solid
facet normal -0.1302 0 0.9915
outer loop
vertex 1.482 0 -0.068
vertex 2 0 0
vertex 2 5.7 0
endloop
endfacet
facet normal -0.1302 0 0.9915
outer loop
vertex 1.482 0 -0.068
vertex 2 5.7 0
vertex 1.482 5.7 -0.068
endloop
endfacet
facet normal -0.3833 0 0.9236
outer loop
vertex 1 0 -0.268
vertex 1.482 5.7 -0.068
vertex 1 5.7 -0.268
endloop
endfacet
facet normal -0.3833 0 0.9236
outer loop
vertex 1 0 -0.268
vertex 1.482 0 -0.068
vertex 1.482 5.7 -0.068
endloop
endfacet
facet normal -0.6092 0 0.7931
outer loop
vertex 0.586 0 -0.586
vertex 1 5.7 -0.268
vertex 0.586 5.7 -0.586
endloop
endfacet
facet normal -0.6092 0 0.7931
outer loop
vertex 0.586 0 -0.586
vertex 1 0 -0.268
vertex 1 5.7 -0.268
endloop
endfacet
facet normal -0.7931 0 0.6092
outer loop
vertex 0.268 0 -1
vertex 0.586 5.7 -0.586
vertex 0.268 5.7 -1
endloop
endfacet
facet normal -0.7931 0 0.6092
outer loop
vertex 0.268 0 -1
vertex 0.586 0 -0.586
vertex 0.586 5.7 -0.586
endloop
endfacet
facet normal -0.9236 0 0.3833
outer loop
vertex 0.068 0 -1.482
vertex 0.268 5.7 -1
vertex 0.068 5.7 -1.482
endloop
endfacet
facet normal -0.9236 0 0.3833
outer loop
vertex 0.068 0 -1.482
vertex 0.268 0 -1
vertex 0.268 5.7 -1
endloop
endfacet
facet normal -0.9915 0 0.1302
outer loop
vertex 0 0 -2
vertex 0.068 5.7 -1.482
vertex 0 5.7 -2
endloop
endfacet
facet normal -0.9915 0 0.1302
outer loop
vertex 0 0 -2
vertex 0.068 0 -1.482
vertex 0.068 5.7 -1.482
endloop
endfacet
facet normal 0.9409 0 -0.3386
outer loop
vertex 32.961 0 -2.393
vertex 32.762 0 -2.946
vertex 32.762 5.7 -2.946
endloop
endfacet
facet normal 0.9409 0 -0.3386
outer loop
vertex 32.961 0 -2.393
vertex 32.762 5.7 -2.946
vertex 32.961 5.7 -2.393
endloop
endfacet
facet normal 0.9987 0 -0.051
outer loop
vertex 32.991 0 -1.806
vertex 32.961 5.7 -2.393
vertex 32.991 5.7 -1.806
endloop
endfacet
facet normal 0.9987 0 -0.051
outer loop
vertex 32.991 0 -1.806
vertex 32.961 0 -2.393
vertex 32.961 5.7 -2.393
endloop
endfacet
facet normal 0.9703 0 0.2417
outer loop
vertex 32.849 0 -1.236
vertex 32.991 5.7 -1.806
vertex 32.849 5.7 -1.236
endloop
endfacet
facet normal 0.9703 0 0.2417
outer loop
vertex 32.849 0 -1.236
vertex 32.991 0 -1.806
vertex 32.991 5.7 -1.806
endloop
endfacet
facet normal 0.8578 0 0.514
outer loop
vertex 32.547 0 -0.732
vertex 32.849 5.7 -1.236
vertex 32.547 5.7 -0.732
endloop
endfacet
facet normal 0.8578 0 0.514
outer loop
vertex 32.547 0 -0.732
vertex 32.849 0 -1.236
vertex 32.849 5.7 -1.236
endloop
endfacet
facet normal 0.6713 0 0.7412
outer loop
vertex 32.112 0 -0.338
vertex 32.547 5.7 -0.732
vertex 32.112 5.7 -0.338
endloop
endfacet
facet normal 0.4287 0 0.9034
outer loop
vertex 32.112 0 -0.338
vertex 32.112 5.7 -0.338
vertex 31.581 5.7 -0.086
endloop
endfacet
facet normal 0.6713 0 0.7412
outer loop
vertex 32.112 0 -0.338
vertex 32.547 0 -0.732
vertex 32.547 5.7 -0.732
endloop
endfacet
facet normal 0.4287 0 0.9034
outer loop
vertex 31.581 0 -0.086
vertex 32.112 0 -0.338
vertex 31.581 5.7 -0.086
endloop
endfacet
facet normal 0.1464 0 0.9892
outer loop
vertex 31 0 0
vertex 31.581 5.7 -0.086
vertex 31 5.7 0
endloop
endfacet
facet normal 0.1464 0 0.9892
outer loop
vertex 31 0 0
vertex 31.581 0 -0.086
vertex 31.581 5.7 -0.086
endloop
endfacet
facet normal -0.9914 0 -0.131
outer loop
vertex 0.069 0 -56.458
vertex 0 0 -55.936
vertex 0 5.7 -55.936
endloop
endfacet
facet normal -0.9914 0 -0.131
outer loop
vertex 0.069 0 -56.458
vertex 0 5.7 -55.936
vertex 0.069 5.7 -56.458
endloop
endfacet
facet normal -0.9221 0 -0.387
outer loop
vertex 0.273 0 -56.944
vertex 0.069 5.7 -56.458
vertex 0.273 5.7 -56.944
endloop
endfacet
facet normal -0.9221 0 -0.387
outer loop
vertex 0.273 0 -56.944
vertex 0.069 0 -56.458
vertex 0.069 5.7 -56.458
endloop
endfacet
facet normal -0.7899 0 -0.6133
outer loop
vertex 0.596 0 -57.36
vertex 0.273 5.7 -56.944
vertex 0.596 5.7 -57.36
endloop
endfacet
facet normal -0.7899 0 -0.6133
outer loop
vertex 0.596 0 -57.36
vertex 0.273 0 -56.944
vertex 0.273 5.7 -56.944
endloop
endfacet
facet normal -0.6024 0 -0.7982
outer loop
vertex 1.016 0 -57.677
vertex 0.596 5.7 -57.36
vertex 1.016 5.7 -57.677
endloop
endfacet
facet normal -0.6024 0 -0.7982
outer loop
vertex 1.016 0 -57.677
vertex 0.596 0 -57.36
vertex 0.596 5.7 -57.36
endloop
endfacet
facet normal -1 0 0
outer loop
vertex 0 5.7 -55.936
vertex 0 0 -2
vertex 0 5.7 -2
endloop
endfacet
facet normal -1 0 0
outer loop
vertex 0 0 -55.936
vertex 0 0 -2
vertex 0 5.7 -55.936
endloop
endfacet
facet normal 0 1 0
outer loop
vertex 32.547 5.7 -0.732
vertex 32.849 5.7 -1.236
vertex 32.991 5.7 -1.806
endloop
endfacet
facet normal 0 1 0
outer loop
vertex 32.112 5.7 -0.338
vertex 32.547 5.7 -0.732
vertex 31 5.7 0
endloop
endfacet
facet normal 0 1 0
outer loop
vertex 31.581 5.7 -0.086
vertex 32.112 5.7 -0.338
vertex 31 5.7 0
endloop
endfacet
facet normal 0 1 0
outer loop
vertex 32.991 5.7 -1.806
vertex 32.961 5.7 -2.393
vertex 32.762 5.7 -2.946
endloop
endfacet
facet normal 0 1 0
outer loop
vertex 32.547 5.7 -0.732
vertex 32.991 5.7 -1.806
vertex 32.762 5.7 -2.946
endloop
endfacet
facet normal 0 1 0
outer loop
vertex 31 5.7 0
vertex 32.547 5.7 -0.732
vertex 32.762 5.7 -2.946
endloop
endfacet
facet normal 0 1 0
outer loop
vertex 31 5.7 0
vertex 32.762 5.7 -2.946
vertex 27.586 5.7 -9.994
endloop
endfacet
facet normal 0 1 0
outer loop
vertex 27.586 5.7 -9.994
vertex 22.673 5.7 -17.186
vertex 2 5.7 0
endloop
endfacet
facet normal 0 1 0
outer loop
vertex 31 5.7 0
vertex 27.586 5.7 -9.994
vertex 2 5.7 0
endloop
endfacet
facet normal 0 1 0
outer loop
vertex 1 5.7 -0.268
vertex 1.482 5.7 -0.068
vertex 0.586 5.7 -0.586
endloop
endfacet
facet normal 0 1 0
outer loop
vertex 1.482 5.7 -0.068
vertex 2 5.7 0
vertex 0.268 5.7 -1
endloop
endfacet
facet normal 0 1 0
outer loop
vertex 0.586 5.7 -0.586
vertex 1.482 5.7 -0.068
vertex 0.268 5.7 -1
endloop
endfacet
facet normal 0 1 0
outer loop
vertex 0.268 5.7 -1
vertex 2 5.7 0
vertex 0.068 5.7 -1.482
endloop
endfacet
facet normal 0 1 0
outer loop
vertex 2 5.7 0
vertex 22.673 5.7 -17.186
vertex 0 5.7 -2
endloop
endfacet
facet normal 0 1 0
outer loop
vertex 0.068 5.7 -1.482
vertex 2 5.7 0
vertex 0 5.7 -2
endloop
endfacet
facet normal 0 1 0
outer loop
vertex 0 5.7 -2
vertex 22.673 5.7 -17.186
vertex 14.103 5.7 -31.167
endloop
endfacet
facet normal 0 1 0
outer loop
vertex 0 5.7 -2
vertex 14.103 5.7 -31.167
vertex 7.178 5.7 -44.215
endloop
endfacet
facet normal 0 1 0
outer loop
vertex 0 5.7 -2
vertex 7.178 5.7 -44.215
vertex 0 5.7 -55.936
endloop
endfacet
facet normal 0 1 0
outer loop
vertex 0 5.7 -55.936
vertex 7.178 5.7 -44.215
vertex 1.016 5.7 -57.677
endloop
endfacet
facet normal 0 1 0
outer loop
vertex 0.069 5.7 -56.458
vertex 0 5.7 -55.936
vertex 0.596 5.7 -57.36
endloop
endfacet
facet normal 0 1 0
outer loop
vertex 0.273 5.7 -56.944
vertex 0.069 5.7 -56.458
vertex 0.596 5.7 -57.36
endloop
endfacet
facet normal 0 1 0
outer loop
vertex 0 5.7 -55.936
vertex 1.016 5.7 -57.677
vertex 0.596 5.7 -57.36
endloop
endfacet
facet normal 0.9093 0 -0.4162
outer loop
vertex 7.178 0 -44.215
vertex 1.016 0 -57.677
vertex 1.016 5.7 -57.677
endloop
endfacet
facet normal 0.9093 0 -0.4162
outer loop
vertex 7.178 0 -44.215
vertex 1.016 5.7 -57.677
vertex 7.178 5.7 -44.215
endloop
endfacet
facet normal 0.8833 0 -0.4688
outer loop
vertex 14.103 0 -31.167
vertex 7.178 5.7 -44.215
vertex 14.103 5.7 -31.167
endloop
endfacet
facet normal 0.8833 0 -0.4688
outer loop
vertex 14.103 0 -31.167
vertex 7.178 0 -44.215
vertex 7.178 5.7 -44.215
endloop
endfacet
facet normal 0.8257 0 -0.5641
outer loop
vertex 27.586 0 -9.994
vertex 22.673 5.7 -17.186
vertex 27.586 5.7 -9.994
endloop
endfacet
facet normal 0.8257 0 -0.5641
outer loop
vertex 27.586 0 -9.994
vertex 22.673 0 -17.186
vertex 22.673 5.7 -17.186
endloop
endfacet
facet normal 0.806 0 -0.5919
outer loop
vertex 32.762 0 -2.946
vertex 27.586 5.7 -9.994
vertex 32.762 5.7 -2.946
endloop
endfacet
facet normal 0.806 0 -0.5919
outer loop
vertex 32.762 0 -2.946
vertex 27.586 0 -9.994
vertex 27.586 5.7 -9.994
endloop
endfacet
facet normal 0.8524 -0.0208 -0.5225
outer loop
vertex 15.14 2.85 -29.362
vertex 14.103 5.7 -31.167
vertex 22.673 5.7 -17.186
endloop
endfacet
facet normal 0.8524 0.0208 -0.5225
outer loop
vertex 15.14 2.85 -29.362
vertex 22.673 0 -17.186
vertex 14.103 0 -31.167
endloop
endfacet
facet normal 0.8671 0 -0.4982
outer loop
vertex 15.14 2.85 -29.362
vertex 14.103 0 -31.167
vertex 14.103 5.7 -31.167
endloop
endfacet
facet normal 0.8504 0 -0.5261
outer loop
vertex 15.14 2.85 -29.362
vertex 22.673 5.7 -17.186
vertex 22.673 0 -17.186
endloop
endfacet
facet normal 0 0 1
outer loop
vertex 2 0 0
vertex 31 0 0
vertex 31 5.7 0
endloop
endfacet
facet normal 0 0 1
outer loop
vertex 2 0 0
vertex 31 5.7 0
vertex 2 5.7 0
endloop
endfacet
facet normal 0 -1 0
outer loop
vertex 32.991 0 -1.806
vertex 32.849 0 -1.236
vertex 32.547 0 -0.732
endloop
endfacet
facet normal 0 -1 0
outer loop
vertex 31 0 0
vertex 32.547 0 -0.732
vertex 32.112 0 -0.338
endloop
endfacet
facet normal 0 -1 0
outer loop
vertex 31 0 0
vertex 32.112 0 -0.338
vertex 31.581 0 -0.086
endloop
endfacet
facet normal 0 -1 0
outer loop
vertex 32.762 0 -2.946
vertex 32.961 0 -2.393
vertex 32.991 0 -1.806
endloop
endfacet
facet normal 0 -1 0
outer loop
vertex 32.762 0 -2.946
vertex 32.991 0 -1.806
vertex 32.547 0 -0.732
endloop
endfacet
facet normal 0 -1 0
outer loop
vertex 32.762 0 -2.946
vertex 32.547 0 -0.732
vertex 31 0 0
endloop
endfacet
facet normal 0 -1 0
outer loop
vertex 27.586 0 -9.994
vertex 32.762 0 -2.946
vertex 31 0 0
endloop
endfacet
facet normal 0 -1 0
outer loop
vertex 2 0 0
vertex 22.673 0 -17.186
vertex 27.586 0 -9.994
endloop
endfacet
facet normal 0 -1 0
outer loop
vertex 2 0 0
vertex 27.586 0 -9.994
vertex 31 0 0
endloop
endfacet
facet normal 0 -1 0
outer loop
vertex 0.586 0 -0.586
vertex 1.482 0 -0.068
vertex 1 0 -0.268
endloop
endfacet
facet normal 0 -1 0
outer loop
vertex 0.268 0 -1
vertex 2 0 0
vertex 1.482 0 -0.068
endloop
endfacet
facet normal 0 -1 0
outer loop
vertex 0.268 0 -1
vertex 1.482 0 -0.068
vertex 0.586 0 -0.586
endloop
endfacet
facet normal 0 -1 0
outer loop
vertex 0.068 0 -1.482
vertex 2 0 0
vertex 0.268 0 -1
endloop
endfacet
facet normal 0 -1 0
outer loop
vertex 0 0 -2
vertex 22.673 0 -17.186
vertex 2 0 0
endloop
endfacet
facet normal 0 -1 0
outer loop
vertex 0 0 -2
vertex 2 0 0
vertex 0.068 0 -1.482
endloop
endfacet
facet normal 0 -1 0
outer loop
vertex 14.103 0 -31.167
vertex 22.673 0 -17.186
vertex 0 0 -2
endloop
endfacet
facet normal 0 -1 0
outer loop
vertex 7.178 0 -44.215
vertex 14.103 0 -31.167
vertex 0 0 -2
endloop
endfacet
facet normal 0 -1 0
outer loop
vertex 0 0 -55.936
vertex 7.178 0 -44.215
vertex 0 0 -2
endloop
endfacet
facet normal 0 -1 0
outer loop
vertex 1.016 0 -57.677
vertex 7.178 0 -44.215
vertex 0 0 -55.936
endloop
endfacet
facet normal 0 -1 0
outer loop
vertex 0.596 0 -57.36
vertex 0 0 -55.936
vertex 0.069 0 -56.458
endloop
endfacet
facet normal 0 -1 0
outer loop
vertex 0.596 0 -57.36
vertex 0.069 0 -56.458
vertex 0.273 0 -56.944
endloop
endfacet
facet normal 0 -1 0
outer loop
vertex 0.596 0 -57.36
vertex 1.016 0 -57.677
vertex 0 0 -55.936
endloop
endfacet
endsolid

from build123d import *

# Parameters (mm, degrees)
BOSS_EXTRUDE1_DEPTH = 5.7


with BuildPart() as part:
    # Sketch1 → Boss-Extrude1 (new body)
    with BuildSketch(Plane(origin=(0, 0, 0), x_dir=(1, 0, 0), z_dir=(0, 1, 0))):
        with BuildLine():
            Line((0, 2), (0, 55.935985031))
            ThreePointArc((0, 55.935985031), (0.272628254, 56.944045968), (1.016186852, 57.677281011))
            add(Edge.make_bspline(
                [(1.016186852, 57.677281011), (13.390937023, 28.412904977), (32.762191576, 2.945875706)],
                knots=[0, 0, 0, 1, 1, 1], degree=2))
            ThreePointArc((32.762191576, 2.945875706), (32.716355355, 0.973294446), (31, 0))
            Line((31, 0), (2, 0))
            ThreePointArc((2, 0), (0.585786438, 0.585786438), (0, 2))
        make_face()
    extrude(amount=BOSS_EXTRUDE1_DEPTH)


solid = part.part
